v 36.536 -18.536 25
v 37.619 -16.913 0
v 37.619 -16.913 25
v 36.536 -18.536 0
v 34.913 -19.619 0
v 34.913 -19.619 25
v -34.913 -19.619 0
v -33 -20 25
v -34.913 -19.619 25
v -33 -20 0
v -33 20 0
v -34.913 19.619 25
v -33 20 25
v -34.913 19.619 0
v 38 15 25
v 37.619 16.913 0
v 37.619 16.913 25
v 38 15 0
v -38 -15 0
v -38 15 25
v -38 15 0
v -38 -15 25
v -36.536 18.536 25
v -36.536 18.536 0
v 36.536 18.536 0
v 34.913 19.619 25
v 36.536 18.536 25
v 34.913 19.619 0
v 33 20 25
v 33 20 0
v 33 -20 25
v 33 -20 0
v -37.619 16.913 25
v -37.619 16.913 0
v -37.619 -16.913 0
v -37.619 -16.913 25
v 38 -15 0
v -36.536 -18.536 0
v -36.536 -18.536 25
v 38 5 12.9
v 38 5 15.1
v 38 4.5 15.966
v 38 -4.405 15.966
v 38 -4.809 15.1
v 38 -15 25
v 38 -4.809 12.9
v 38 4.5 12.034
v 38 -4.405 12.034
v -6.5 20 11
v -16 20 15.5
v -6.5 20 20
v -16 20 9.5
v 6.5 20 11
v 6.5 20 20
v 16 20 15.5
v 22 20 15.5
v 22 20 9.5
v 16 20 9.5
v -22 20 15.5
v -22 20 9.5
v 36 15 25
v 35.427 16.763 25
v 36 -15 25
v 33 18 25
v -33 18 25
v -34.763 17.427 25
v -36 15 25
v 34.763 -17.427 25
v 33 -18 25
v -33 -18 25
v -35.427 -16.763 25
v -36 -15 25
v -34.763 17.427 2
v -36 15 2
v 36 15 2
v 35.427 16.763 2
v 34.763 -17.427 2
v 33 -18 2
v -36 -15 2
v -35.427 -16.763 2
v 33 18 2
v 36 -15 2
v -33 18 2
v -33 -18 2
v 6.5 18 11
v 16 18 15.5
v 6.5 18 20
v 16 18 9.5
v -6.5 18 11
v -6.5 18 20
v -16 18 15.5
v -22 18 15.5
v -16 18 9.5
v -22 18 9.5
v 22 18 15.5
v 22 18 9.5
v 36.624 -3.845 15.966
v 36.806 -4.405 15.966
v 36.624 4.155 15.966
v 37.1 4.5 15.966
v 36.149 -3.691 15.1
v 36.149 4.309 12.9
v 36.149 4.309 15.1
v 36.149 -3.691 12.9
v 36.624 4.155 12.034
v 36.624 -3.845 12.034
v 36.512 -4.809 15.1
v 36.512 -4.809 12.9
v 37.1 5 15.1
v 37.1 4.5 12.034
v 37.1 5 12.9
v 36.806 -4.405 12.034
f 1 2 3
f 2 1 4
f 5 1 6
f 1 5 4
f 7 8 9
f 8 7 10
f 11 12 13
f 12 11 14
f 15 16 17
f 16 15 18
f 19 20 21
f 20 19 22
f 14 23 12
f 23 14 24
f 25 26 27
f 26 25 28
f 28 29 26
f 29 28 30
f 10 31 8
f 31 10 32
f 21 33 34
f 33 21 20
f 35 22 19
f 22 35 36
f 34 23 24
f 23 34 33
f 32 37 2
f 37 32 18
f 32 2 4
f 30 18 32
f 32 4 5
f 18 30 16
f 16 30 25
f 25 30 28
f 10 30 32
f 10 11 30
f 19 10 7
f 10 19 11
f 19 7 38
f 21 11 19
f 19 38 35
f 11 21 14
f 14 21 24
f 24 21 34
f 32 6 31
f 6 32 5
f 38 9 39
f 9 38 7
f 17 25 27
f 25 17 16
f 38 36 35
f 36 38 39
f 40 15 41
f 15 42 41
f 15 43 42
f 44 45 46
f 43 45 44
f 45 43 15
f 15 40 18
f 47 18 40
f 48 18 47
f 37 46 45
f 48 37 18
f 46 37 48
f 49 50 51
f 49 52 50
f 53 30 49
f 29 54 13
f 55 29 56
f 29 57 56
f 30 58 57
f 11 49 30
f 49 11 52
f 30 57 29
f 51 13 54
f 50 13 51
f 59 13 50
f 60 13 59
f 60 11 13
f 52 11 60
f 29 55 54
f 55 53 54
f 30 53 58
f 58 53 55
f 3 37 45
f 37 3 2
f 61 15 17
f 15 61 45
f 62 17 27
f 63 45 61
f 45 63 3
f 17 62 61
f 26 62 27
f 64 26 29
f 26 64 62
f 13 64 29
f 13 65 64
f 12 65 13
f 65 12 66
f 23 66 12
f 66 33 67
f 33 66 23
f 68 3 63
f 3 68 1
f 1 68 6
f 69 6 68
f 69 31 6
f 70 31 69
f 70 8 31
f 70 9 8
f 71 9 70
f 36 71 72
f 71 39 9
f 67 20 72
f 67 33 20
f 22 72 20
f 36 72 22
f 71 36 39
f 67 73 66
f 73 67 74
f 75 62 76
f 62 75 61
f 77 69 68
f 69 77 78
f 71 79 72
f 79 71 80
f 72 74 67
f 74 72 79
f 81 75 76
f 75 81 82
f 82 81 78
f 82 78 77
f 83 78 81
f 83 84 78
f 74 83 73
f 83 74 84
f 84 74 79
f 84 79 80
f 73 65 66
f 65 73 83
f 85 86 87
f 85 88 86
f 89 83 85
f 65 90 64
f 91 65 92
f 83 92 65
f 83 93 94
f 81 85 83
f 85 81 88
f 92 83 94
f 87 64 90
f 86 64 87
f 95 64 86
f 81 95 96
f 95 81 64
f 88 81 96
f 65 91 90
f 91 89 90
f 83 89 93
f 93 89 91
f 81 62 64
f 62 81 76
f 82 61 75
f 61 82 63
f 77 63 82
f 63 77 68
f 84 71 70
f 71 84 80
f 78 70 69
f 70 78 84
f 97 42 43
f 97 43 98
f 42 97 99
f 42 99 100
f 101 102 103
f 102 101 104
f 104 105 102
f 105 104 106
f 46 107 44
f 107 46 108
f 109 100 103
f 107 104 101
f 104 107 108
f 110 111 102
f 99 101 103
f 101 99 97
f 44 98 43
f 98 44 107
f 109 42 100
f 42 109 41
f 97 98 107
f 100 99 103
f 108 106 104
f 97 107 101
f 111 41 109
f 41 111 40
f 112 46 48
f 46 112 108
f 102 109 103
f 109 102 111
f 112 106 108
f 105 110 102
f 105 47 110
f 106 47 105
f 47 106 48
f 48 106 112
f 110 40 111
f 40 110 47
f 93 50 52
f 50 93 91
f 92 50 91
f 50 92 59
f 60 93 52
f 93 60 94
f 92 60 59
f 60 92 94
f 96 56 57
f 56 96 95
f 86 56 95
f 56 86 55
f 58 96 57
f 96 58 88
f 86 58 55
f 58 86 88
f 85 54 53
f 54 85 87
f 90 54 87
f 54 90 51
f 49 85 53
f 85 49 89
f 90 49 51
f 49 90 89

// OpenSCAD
// Parameters
length = 76;            // Outer length of the box
width = 40;             // Outer width of the box
height = 25;            // Height of the box
wall_thickness = 2;     // Thickness of the walls (returned to 2mm)
corner_radius = 5;      // Radius of the outer corners

// USB Type-C hole parameters
usb_width = 10;         // Width of the USB Type-C hole
usb_height = 4;         // Height of the USB Type-C hole
usb_corner_radius = 1;  // Corner radius for the USB hole (optional)
usb_position_y = 0;     // Y position (centered vertically on the side wall)
usb_position_z = wall_thickness + usb_height / 2 + 10; // Near bottom edge

// Push button hole parameters
button_size = 6;        // Size of the push button holes (6mm x 6mm)
button1_position_x = -length / 4;  // Position of the first button hole
button2_position_x = length / 4;   // Position of the second button hole
button_position_z = (height / 2);    // Centered vertically

// New hole parameters
new_hole_width = 13;        // Width of the new hole (along the x-axis)
new_hole_height = 9;      // Height of the new hole (along the z-axis)
new_hole_position_x = 0;   // Position of the new hole along the x-axis (centered between existing holes)
new_hole_position_z = button_position_z + 3; // Vertical position (same as existing holes)

// Tolerance for proper subtraction
epsilon = 0.1;          // Small offset to ensure clean subtraction

// Calculate inner_corner_radius and handle corner_radius < wall_thickness
if (corner_radius < wall_thickness) {
    echo("Error: corner_radius must be greater than or equal to wall_thickness");
    corner_radius = wall_thickness; // Set corner_radius to wall_thickness to avoid negative values
}
inner_corner_radius = corner_radius - wall_thickness;

difference() {
    // Outer box with rounded corners
    linear_extrude(height)
        rounded_rectangle(length, width, corner_radius);

    // Inner box to create the hollow space
    translate([0, 0, wall_thickness])
        linear_extrude(height - wall_thickness)
            rounded_rectangle(length - 2 * wall_thickness, width - 2 * wall_thickness, inner_corner_radius);

    // USB Type-C hole on the longer side, near the bottom edge
    translate([length / 2 + epsilon, usb_position_y, usb_position_z])
        rotate([0, 0, 90]) // Rotate to align with the side wall
            usb_hole();

    // Push button holes on one of the sides
    // First button hole
    translate([button1_position_x, width / 2 + epsilon, button_position_z])
        cube([button_size, width + 2 * epsilon, button_size], center=true);

    // Second button hole
    translate([button2_position_x, width / 2 + epsilon, button_position_z])
        cube([button_size, width + 2 * epsilon, button_size], center=true);

    // New rectangular hole between the two existing holes
    translate([new_hole_position_x, width / 2 + epsilon, new_hole_position_z])
        cube([new_hole_width, width + 2 * epsilon, new_hole_height], center=true);
}

// Module to create a rounded rectangle
module rounded_rectangle(len, wid, rad) {
    rad = min(rad, len / 2, wid / 2); // Ensure radius does not exceed half the length or width
    offset(r=rad)
        square([len - 2 * rad, wid - 2 * rad], center=true);
}

// Module for the USB Type-C hole
module usb_hole() {
    if (usb_corner_radius > 0) {
        minkowski() {
            cube([usb_width - 2 * usb_corner_radius, usb_height - 2 * usb_corner_radius, wall_thickness + 2 * epsilon], center=true);
            sphere(r=usb_corner_radius);
        }
    } else {
        cube([usb_width, usb_height, wall_thickness + 2 * epsilon], center=true);
    }
}
